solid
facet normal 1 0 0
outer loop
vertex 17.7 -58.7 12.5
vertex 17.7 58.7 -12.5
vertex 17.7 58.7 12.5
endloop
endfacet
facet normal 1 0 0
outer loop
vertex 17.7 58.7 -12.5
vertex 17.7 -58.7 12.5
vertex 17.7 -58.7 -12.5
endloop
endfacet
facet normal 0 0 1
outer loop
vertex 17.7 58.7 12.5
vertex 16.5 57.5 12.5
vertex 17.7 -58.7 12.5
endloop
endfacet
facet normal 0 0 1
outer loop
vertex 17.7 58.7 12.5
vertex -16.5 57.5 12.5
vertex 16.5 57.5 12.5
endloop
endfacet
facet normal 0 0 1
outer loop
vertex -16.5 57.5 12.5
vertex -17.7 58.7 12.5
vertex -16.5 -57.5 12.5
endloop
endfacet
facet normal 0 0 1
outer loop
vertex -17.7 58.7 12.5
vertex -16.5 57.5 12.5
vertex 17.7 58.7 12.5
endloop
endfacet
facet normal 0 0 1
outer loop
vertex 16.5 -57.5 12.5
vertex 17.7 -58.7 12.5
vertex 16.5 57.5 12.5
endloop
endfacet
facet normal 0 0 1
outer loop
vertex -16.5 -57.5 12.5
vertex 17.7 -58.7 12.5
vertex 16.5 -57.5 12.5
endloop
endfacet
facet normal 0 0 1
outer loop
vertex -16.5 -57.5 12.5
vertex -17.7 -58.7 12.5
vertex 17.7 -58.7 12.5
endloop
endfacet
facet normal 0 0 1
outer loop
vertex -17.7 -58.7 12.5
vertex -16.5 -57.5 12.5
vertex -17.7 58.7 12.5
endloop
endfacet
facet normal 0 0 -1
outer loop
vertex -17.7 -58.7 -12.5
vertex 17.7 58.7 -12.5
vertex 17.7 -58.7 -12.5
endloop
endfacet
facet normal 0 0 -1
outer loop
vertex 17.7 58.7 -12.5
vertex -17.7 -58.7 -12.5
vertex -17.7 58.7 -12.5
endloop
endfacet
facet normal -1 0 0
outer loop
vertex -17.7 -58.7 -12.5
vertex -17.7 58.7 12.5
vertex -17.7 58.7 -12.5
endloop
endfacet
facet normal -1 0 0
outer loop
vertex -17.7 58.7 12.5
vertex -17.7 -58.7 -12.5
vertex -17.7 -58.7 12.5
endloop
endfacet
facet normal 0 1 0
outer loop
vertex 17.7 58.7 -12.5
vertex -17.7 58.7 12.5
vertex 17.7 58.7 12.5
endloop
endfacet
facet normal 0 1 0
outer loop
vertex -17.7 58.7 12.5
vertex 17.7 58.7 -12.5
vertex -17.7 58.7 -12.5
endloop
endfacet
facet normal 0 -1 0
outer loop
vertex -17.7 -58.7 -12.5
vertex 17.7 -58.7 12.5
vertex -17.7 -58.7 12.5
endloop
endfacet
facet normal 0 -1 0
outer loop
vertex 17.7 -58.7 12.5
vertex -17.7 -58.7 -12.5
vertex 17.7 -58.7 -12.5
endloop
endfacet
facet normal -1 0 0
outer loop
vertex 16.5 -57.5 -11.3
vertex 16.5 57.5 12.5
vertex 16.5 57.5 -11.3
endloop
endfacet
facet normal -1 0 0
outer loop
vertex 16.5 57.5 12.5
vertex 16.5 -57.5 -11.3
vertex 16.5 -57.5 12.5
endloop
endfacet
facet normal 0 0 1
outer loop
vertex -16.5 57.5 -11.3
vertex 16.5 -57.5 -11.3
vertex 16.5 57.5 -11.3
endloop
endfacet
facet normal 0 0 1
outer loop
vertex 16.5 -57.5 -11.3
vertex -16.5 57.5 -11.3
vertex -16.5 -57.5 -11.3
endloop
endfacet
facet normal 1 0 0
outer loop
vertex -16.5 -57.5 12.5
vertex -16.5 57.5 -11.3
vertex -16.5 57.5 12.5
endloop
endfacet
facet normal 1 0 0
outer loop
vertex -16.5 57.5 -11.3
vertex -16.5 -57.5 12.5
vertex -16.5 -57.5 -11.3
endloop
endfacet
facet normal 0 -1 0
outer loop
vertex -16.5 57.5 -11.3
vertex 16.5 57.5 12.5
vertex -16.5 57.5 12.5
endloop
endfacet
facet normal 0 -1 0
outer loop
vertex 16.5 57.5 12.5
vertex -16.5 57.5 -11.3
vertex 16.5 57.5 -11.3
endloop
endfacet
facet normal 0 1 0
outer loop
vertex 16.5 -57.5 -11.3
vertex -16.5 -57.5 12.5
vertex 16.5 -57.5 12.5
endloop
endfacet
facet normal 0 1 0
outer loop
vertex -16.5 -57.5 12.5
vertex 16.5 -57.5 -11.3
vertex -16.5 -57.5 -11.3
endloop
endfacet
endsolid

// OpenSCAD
// Root Box

Box = true;
Cardholder = false;

Wand = 1.2;

B_innen = 33.0;
L_innen = 115.0;
H_aussen = 25.0;

Separator = false;
x_num = 1;
y_num = 1;


//

module root_box () {

    b = B_innen + 2*Wand;
    l = L_innen + 2*Wand;
    h = H_aussen;
    
    difference() {
        cube([b,l,h],center=true);
        translate([0,0,Wand])
        cube([B_innen,L_innen,h],center=true);
    };
    
    if (Separator) root_separator();
}

module root_holder() {
    
    difference() {
        root_box();
        translate([0,0,-H_aussen/2])
        cylinder(d=B_innen*0.75,h=2*Wand);

        translate([0,L_innen/2,Wand])
        cube([B_innen*0.75,2*Wand,H_aussen], center=true);
    }
}

module root_card_holder() {
    union() {
        root_holder();
        translate([B_innen+Wand,0,0]) root_holder();
    }
}


module root_separator() {
    
    x_off = B_innen / x_num;
    y_off = L_innen / y_num;
    
    for (i=[-L_innen/2:y_off:+L_innen/2]) {
        translate([0,i,0])
        cube([B_innen,Wand,H_aussen], center = true);
    }
    for (i=[-B_innen/2:x_off:+B_innen/2]) {
        translate([i,0,0])
        cube([Wand,L_innen,H_aussen], center = true);
    }
}

if (Box) root_box();

if (Cardholder) root_card_holder();
    
